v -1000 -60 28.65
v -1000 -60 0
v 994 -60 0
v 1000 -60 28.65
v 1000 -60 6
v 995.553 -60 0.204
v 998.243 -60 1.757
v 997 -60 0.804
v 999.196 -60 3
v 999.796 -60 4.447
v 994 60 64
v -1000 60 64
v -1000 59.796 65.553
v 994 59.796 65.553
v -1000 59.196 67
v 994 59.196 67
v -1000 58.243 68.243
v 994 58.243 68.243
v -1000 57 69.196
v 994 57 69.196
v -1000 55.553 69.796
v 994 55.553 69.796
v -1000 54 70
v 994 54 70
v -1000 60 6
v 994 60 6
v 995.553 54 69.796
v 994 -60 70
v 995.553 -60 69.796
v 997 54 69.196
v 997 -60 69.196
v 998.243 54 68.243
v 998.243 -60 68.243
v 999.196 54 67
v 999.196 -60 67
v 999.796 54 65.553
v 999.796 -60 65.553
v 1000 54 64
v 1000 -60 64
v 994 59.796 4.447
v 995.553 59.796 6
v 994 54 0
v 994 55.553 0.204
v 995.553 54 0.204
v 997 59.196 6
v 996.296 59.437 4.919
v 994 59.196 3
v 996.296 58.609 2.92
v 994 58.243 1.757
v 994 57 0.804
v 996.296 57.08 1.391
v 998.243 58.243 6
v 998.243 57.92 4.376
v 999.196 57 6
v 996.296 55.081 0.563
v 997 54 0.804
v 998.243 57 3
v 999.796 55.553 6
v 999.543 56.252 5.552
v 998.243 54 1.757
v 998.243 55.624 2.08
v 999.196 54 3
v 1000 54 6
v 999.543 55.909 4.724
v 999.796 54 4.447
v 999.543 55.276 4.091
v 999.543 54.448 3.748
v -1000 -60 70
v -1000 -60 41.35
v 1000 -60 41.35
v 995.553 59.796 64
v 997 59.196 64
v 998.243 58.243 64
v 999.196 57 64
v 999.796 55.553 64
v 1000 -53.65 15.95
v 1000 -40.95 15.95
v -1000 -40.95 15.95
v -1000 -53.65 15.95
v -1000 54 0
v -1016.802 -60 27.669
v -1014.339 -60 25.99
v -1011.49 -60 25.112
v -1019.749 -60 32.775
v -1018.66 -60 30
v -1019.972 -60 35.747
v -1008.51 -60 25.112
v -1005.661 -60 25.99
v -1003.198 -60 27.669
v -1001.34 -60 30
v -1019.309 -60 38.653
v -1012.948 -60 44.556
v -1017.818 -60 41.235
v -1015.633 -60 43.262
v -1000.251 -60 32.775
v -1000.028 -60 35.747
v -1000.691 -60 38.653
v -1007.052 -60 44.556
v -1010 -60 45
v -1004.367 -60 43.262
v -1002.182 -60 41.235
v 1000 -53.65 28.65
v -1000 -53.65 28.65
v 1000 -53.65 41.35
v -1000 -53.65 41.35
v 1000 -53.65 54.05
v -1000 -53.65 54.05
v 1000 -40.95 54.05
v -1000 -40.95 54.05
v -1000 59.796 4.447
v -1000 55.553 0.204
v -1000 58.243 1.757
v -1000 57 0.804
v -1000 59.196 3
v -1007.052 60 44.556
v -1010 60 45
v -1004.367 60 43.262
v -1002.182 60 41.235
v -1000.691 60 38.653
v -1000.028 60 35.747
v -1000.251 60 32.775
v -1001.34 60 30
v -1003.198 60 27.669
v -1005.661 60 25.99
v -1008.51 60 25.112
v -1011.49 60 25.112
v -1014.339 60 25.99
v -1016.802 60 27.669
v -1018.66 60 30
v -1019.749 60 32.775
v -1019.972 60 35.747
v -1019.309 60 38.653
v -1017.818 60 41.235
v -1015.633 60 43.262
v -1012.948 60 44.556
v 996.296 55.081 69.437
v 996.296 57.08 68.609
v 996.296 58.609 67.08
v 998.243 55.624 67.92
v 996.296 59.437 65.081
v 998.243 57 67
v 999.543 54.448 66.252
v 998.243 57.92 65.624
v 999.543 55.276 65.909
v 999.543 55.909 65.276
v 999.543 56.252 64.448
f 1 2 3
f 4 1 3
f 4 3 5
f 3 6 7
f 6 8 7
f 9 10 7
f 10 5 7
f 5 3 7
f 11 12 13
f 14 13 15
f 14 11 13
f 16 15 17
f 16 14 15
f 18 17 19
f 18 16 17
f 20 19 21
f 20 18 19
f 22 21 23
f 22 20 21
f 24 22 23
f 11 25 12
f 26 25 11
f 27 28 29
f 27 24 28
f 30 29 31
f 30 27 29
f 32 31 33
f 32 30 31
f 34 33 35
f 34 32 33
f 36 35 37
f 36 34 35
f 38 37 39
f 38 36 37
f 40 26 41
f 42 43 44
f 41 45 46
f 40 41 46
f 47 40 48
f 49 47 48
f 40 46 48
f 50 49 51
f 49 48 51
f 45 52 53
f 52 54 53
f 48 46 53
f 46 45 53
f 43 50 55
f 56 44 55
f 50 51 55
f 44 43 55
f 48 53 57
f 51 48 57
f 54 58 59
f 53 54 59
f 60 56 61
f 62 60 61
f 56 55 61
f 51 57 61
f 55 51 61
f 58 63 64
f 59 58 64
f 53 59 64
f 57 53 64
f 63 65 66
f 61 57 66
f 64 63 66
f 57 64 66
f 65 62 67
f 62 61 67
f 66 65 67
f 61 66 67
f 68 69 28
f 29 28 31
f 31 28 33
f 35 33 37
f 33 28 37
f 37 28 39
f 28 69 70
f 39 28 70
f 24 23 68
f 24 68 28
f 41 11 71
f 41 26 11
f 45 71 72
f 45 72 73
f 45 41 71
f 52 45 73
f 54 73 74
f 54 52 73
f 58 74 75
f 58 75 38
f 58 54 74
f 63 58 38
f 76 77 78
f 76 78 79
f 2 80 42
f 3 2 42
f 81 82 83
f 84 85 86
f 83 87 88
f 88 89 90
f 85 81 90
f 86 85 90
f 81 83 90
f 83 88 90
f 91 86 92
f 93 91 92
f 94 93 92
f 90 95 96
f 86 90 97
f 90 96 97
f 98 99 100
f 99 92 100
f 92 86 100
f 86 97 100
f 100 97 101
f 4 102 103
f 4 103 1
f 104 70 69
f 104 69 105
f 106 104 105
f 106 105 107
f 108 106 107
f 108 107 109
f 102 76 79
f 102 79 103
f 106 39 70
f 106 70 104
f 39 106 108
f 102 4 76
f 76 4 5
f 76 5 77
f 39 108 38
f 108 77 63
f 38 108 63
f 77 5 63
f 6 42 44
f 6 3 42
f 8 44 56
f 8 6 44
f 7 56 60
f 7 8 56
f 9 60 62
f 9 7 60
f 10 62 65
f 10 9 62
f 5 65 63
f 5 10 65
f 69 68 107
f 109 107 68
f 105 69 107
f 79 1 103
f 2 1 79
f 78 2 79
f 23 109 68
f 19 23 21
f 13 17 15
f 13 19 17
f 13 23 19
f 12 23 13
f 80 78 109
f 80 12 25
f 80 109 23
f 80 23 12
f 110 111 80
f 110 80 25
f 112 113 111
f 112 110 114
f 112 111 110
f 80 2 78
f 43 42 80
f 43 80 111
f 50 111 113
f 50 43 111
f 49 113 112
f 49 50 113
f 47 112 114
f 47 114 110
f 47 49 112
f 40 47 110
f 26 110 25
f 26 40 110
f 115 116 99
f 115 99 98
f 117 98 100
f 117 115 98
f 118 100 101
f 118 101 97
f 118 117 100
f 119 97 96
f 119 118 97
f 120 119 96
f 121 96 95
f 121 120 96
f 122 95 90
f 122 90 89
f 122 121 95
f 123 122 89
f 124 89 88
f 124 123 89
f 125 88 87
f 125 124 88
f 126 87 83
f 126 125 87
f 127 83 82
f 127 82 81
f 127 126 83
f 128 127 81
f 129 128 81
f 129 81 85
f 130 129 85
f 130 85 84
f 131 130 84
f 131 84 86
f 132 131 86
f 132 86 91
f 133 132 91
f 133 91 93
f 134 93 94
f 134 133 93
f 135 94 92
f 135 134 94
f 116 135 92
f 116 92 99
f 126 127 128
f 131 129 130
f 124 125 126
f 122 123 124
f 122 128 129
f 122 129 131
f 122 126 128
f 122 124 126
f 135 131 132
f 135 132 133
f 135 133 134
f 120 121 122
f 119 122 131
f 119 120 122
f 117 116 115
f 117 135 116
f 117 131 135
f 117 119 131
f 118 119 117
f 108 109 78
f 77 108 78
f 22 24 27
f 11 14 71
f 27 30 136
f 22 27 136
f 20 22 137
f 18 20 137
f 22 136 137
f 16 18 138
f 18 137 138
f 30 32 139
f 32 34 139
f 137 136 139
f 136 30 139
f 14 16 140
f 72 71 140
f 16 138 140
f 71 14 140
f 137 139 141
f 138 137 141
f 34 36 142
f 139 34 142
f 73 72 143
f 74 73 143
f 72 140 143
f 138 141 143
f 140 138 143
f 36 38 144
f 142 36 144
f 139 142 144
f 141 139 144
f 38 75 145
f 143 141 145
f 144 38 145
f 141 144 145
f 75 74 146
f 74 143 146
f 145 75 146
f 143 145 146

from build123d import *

# Parameters (mm, degrees)
CROQUIS1_W              = 2000
CROQUIS1_H              = 120
SALIENTE_EXTRUIR1_DEPTH = 70
CROQUIS2_R              = 10
SALIENTE_EXTRUIR2_DEPTH = 120
CORTAR_EXTRUIR1_DEPTH   = 2000
REDONDEO1_R             = 6
REDONDEO2_R             = 6


with BuildPart() as part:
    # Croquis1 → Saliente-Extruir1 (new body)
    with BuildSketch(Plane.XY):
        Rectangle(CROQUIS1_W, CROQUIS1_H)
    extrude(amount=SALIENTE_EXTRUIR1_DEPTH)

    # Croquis3 → Cortar-Extruir1 (cut)
    with BuildSketch(Plane(origin=(1000, 0, 0), x_dir=(0, 0, -1), z_dir=(1, 0, 0))):
        Polygon((-41.35, -60), (-41.35, -53.65), (-54.05, -53.65), (-54.05, -40.95), (-15.95, -40.95), (-15.95, -53.65), (-28.65, -53.65), (-28.65, -60), align=None)
    extrude(amount=-CORTAR_EXTRUIR1_DEPTH, mode=Mode.SUBTRACT)

    # Redondeo1
    redondeo1_edges = [part.edges().sort_by_distance(p)[0] for p in [
        (0, 60, 0),
        (0, 60, 70),
    ]]
    fillet(redondeo1_edges, radius=REDONDEO1_R)

    # Redondeo2
    redondeo2_edges = [part.edges().sort_by_distance(p)[0] for p in [
        (1000, -3, 70),
        (1000, 60, 35),
        (1000, 58.242640687, 68.242640687),
        (1000, 58.242640687, 1.757359313),
        (1000, -3, 0),
    ]]
    fillet(redondeo2_edges, radius=REDONDEO2_R)


with BuildPart() as body_2:
    # Croquis2 → Saliente-Extruir2 (new body)
    with BuildSketch(Plane(origin=(0, 60, 0), x_dir=(1, 0, 0), z_dir=(0, 1, 0))):
        with Locations(Location((-1010, -35, 0), (0, 0, 270))):
            Circle(CROQUIS2_R)
    extrude(amount=-SALIENTE_EXTRUIR2_DEPTH)


solid = Compound([part.part, body_2.part])
